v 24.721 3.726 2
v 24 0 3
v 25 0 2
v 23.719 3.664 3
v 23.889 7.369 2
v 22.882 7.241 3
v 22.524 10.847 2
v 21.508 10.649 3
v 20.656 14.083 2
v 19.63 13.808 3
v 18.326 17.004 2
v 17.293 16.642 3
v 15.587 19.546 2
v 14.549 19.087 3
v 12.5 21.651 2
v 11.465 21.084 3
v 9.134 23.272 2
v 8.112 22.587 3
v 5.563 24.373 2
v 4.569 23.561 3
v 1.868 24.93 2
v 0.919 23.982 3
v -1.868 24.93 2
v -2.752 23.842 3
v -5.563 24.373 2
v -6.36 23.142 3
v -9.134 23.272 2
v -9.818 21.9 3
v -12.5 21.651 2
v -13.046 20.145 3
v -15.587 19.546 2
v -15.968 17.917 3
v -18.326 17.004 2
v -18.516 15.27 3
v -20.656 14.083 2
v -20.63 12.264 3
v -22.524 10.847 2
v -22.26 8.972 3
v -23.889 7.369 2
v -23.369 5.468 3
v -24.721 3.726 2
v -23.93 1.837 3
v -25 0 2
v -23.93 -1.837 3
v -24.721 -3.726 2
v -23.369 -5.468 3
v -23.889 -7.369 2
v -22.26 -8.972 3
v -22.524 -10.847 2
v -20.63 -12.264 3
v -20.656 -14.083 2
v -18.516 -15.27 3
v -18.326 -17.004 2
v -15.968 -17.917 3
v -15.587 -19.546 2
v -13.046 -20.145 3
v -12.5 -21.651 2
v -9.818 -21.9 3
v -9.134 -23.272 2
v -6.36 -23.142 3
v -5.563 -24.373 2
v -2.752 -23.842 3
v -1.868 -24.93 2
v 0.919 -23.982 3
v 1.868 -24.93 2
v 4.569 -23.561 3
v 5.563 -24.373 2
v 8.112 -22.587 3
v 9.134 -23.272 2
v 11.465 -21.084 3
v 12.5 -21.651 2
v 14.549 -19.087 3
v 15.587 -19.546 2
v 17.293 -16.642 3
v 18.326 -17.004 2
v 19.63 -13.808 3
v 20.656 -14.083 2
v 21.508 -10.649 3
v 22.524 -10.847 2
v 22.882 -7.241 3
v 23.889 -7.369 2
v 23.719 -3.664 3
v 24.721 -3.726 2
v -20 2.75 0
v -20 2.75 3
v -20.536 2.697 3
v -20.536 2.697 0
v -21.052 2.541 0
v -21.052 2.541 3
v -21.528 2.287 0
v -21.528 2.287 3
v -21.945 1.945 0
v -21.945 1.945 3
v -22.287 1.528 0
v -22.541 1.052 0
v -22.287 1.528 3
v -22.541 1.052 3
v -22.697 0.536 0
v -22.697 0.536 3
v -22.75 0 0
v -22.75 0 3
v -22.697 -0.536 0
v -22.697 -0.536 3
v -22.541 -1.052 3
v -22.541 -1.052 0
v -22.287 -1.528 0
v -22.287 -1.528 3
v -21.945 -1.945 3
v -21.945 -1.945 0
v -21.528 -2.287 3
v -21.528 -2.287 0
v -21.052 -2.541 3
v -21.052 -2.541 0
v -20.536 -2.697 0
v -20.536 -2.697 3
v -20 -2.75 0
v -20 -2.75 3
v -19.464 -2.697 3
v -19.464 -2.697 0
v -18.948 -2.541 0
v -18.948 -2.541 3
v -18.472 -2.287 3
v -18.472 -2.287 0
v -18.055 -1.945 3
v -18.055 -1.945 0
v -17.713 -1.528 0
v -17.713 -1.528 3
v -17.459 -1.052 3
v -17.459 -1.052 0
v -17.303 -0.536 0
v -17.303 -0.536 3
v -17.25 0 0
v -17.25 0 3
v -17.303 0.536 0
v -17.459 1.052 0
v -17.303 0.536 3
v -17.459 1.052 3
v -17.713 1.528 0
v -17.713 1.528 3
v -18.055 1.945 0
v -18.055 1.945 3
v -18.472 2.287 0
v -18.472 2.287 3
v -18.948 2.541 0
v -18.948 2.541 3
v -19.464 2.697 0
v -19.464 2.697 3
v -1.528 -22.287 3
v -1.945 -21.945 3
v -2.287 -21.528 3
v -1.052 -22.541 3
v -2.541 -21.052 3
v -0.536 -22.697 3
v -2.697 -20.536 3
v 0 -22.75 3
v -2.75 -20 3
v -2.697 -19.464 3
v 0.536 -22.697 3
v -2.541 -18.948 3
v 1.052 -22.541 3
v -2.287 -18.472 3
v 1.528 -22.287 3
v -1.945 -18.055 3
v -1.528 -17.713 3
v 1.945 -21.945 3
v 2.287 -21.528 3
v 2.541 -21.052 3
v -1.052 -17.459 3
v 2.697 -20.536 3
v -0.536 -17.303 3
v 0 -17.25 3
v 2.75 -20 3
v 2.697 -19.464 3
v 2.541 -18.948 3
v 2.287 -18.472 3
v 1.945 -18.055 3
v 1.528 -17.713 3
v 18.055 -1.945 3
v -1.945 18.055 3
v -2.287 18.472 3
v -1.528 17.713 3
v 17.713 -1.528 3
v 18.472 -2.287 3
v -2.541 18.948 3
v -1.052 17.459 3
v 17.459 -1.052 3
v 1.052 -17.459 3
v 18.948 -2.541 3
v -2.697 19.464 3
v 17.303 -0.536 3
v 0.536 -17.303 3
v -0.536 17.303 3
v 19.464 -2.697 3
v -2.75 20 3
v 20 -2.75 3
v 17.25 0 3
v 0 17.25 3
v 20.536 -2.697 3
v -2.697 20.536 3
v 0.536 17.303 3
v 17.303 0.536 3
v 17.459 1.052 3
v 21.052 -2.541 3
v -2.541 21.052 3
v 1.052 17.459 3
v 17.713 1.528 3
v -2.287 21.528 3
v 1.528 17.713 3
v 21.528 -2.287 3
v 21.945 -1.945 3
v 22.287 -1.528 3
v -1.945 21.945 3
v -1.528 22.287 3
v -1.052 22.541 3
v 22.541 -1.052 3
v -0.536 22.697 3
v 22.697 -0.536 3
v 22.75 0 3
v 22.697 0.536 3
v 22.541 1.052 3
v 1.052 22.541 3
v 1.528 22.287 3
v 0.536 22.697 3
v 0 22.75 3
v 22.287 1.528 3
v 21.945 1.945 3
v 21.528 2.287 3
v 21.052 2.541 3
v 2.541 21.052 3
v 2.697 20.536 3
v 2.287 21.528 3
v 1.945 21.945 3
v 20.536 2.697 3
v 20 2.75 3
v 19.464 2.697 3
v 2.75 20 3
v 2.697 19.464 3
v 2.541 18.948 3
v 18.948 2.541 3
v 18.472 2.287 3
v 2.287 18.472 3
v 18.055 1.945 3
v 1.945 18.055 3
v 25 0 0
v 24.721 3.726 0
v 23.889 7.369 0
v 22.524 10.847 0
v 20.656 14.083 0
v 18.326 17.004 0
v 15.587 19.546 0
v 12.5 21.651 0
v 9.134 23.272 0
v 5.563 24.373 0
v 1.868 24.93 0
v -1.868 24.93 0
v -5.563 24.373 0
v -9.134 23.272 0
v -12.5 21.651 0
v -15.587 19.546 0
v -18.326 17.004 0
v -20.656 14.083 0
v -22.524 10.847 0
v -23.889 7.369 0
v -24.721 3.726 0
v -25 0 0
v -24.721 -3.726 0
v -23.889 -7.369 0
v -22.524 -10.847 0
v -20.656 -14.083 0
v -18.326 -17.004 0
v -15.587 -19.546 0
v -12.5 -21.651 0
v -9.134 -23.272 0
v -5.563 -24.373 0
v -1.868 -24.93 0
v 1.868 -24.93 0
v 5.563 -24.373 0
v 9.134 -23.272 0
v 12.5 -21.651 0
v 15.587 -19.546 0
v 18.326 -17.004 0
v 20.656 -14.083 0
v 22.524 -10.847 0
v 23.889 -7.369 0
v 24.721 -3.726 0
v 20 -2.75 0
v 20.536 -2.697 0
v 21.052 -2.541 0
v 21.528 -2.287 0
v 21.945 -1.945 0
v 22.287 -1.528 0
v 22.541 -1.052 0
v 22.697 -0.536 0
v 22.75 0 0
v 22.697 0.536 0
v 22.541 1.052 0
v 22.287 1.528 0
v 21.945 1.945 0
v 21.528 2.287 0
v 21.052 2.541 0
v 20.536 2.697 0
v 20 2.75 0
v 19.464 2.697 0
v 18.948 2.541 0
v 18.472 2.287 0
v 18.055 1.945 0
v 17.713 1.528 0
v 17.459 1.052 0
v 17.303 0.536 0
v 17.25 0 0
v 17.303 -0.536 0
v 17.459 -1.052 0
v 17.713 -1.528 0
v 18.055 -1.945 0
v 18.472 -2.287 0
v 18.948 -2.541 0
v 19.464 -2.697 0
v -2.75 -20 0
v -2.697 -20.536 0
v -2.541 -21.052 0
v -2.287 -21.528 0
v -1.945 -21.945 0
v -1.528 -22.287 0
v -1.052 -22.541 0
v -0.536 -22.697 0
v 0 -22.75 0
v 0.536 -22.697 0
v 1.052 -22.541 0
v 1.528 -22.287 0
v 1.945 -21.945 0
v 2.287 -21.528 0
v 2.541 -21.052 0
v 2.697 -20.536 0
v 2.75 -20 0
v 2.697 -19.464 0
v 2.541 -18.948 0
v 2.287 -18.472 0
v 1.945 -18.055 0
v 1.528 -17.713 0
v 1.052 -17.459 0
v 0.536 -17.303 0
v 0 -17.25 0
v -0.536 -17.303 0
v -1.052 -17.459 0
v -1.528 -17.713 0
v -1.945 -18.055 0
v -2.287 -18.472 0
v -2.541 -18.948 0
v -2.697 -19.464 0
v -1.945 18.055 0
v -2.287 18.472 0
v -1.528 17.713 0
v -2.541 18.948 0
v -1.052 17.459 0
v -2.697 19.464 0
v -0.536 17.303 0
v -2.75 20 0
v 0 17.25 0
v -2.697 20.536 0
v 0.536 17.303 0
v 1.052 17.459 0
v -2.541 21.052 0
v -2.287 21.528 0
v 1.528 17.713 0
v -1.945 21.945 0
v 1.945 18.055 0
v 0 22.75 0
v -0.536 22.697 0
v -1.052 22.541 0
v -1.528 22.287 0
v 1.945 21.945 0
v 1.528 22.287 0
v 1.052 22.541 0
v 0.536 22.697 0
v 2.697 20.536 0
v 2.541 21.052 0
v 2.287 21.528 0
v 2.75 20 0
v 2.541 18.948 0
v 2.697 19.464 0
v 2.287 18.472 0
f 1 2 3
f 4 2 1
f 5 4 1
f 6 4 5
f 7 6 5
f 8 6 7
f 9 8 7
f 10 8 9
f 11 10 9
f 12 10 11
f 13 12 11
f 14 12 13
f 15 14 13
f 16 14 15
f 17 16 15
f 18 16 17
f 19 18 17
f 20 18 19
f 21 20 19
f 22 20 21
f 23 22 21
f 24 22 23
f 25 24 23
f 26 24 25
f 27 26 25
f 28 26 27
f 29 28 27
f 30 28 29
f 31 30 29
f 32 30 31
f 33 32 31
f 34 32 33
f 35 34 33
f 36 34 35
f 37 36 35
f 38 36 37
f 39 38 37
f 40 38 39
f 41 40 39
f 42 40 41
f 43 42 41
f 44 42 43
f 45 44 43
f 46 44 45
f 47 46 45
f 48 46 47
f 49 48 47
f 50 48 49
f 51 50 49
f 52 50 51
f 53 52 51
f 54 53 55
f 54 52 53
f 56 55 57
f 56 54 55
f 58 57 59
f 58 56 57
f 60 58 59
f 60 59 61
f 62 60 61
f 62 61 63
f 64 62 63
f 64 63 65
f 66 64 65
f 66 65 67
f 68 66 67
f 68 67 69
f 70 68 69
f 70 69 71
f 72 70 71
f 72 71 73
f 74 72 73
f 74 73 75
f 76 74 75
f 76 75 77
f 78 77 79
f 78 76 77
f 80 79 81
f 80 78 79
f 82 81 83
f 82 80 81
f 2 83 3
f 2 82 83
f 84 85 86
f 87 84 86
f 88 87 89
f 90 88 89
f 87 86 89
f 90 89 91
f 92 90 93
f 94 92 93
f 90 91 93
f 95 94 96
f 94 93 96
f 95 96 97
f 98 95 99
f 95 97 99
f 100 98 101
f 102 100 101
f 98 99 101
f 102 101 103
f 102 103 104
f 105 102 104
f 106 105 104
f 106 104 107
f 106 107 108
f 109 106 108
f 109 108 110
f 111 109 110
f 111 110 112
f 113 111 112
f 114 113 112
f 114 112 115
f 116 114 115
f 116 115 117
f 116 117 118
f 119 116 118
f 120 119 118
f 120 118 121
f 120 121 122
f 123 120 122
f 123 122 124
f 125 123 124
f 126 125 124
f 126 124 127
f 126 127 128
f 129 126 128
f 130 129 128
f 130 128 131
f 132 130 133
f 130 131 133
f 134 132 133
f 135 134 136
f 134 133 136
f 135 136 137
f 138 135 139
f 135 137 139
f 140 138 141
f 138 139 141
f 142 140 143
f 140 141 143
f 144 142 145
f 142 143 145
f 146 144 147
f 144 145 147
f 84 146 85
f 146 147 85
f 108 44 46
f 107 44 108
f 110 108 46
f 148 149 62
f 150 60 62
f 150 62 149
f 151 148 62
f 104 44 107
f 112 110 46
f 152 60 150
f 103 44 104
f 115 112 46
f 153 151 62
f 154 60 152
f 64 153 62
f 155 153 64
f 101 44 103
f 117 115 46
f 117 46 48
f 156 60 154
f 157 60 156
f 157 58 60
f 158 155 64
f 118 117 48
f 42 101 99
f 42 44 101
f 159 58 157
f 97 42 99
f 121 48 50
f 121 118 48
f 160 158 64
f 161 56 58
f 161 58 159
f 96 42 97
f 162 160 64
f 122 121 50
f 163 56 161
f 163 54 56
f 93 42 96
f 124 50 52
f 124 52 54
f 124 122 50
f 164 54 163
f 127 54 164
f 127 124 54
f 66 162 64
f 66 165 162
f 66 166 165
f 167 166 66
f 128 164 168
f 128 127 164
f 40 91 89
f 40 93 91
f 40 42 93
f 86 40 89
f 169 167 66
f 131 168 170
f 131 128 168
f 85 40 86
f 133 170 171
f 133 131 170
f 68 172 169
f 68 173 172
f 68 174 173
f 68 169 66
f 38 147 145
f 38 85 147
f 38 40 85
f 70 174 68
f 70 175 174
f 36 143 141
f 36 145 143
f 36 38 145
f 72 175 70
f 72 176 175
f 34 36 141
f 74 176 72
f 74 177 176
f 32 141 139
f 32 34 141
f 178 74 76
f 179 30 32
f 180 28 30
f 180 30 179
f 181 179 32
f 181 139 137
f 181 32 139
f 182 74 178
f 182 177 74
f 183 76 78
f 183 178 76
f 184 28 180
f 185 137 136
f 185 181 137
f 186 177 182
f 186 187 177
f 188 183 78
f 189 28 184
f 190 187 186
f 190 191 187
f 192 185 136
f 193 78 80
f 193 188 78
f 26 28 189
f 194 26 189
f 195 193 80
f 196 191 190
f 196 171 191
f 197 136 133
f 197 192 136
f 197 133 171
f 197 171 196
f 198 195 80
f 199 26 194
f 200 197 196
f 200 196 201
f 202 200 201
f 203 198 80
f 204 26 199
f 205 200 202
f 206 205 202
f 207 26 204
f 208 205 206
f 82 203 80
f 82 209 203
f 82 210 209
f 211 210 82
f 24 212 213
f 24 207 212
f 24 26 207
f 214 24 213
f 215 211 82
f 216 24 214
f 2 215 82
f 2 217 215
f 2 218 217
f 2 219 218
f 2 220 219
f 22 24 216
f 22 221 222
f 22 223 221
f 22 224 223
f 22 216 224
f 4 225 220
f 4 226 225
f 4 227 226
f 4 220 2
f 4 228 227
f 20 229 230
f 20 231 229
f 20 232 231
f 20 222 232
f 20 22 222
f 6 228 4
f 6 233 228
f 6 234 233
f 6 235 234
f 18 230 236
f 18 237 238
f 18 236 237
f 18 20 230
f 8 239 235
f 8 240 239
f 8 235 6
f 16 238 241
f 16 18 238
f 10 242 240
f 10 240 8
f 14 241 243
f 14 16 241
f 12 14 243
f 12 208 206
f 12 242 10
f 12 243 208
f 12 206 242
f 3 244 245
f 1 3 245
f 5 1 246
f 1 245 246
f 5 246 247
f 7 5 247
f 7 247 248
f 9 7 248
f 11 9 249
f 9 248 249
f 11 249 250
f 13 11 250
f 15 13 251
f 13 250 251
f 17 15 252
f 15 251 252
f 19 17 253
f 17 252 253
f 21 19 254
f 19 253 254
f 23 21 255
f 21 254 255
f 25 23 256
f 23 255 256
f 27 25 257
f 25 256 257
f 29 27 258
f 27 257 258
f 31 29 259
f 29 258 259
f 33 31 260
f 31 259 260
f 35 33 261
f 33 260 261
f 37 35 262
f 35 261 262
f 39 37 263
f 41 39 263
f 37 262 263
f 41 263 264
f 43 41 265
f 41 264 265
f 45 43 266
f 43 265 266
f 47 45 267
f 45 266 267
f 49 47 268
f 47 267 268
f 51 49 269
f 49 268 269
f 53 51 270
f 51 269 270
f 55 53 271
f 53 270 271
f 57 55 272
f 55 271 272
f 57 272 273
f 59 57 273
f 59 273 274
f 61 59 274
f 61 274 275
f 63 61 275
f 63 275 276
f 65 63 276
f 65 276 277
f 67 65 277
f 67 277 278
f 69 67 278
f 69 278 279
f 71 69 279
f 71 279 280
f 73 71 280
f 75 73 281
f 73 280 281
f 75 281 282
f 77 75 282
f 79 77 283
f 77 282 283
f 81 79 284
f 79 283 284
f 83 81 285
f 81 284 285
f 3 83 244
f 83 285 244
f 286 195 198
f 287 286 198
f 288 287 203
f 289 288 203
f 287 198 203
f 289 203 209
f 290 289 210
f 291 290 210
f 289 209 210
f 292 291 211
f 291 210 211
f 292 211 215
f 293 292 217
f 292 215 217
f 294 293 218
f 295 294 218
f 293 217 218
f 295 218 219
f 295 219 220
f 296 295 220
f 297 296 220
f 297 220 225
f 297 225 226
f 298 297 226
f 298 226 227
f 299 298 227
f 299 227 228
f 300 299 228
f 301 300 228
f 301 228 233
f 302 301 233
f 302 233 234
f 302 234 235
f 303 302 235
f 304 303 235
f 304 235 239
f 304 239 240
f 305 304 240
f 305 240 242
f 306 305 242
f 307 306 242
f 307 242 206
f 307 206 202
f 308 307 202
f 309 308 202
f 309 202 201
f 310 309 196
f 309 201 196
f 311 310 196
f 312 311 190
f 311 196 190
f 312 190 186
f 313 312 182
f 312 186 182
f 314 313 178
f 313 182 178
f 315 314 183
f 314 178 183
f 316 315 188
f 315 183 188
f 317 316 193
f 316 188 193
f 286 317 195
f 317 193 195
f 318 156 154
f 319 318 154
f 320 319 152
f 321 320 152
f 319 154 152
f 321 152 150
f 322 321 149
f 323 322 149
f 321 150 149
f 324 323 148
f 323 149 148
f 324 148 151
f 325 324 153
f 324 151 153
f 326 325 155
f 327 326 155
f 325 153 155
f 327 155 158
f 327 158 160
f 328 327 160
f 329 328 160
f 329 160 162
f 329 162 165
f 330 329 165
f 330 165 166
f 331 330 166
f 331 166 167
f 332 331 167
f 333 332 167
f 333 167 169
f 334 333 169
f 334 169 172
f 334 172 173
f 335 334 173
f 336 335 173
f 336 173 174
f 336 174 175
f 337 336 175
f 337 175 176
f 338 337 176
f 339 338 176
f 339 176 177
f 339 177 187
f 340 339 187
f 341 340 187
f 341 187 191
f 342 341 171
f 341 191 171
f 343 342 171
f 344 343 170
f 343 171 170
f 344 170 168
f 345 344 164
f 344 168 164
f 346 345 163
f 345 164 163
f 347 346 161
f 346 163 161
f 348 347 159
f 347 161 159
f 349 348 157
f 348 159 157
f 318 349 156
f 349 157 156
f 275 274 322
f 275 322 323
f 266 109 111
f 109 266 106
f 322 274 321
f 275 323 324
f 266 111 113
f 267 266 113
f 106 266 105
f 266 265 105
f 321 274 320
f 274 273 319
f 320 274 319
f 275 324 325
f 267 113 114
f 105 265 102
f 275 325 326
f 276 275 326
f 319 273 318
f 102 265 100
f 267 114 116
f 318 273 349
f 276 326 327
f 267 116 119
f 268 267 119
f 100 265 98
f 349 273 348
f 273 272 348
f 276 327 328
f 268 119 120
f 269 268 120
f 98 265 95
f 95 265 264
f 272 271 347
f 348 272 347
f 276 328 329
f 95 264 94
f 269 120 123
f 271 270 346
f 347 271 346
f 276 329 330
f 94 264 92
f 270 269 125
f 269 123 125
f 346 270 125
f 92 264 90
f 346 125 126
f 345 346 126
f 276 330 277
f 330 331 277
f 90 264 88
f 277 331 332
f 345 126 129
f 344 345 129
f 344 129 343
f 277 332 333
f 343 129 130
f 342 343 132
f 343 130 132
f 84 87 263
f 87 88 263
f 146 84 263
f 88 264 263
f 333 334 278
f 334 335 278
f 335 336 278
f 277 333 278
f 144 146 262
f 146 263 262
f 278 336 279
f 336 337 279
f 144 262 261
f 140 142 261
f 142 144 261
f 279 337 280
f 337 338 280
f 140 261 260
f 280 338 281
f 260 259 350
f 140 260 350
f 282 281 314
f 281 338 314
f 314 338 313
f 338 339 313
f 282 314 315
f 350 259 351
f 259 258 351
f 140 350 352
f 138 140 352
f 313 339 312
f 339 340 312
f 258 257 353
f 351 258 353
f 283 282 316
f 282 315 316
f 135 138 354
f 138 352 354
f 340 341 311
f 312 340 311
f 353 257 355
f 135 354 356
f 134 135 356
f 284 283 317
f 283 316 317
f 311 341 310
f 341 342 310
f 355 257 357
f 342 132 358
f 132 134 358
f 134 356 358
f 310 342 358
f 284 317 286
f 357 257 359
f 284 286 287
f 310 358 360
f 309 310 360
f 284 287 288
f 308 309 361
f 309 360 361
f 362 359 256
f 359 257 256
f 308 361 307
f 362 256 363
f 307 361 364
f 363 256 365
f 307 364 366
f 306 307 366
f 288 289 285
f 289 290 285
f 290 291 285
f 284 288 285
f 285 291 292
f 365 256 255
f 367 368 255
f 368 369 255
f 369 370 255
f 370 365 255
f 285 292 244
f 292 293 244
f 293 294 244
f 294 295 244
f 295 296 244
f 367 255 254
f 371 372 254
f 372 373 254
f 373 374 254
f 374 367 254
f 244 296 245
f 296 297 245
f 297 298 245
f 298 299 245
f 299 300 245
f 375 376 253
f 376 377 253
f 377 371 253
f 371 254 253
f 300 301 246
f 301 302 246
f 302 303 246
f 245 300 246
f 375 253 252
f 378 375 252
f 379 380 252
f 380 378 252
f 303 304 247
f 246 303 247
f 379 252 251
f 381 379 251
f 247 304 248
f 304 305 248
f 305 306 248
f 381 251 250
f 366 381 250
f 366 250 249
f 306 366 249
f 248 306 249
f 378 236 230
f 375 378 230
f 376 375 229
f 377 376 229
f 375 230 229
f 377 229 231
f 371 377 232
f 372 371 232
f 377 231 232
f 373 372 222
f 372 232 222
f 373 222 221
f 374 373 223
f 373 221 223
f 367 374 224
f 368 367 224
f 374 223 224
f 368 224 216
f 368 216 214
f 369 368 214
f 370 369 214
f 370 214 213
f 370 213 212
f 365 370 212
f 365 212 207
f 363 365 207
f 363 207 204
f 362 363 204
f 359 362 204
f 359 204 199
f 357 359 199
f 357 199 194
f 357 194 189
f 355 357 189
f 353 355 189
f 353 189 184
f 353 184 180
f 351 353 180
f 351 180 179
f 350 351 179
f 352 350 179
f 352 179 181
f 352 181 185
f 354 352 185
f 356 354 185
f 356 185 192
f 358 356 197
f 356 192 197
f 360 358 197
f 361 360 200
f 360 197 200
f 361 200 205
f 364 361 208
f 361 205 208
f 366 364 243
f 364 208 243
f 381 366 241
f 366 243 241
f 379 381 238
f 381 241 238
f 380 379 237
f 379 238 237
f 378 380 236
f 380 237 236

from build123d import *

# Parameters (mm, degrees)
SKETCH_1_R               = 25
EXTRUDE_1_DEPTH          = 3
CHAMFER_1_SIZE           = 1
SKETCH_2_R               = 2.75
CUT_EXTRUDE_1_DEPTH      = 36.482389998
PATTERN_CIRCULAR_1_COUNT = 4


with BuildPart() as part:
    # 草图1 → 凸台-拉伸1 (new body)
    with BuildSketch(Plane.XY):
        Circle(SKETCH_1_R)
    extrude(amount=EXTRUDE_1_DEPTH)

    # 倒角1
    chamfer_1_edges = [part.edges().sort_by_distance(p)[0] for p in [
        (-25, 0, 3),
    ]]
    chamfer(chamfer_1_edges, length=CHAMFER_1_SIZE)

    # 草图2 → 切除-拉伸1 (cut, through all)
    with BuildSketch(Plane.XY.offset(3)):
        with Locations((0, 20)):
            Circle(SKETCH_2_R)
    cut_extrude_1 = extrude(amount=-CUT_EXTRUDE_1_DEPTH, mode=Mode.SUBTRACT)

    # 阵列(圆周)1: 切除-拉伸1 ×4 about axis
    pattern_circular_1_axis = Axis((0, 0, 0), (0, 0, 1))
    for i in range(1, PATTERN_CIRCULAR_1_COUNT):
        add(cut_extrude_1.rotate(pattern_circular_1_axis, i * 360 / PATTERN_CIRCULAR_1_COUNT), mode=Mode.SUBTRACT)


solid = part.part
